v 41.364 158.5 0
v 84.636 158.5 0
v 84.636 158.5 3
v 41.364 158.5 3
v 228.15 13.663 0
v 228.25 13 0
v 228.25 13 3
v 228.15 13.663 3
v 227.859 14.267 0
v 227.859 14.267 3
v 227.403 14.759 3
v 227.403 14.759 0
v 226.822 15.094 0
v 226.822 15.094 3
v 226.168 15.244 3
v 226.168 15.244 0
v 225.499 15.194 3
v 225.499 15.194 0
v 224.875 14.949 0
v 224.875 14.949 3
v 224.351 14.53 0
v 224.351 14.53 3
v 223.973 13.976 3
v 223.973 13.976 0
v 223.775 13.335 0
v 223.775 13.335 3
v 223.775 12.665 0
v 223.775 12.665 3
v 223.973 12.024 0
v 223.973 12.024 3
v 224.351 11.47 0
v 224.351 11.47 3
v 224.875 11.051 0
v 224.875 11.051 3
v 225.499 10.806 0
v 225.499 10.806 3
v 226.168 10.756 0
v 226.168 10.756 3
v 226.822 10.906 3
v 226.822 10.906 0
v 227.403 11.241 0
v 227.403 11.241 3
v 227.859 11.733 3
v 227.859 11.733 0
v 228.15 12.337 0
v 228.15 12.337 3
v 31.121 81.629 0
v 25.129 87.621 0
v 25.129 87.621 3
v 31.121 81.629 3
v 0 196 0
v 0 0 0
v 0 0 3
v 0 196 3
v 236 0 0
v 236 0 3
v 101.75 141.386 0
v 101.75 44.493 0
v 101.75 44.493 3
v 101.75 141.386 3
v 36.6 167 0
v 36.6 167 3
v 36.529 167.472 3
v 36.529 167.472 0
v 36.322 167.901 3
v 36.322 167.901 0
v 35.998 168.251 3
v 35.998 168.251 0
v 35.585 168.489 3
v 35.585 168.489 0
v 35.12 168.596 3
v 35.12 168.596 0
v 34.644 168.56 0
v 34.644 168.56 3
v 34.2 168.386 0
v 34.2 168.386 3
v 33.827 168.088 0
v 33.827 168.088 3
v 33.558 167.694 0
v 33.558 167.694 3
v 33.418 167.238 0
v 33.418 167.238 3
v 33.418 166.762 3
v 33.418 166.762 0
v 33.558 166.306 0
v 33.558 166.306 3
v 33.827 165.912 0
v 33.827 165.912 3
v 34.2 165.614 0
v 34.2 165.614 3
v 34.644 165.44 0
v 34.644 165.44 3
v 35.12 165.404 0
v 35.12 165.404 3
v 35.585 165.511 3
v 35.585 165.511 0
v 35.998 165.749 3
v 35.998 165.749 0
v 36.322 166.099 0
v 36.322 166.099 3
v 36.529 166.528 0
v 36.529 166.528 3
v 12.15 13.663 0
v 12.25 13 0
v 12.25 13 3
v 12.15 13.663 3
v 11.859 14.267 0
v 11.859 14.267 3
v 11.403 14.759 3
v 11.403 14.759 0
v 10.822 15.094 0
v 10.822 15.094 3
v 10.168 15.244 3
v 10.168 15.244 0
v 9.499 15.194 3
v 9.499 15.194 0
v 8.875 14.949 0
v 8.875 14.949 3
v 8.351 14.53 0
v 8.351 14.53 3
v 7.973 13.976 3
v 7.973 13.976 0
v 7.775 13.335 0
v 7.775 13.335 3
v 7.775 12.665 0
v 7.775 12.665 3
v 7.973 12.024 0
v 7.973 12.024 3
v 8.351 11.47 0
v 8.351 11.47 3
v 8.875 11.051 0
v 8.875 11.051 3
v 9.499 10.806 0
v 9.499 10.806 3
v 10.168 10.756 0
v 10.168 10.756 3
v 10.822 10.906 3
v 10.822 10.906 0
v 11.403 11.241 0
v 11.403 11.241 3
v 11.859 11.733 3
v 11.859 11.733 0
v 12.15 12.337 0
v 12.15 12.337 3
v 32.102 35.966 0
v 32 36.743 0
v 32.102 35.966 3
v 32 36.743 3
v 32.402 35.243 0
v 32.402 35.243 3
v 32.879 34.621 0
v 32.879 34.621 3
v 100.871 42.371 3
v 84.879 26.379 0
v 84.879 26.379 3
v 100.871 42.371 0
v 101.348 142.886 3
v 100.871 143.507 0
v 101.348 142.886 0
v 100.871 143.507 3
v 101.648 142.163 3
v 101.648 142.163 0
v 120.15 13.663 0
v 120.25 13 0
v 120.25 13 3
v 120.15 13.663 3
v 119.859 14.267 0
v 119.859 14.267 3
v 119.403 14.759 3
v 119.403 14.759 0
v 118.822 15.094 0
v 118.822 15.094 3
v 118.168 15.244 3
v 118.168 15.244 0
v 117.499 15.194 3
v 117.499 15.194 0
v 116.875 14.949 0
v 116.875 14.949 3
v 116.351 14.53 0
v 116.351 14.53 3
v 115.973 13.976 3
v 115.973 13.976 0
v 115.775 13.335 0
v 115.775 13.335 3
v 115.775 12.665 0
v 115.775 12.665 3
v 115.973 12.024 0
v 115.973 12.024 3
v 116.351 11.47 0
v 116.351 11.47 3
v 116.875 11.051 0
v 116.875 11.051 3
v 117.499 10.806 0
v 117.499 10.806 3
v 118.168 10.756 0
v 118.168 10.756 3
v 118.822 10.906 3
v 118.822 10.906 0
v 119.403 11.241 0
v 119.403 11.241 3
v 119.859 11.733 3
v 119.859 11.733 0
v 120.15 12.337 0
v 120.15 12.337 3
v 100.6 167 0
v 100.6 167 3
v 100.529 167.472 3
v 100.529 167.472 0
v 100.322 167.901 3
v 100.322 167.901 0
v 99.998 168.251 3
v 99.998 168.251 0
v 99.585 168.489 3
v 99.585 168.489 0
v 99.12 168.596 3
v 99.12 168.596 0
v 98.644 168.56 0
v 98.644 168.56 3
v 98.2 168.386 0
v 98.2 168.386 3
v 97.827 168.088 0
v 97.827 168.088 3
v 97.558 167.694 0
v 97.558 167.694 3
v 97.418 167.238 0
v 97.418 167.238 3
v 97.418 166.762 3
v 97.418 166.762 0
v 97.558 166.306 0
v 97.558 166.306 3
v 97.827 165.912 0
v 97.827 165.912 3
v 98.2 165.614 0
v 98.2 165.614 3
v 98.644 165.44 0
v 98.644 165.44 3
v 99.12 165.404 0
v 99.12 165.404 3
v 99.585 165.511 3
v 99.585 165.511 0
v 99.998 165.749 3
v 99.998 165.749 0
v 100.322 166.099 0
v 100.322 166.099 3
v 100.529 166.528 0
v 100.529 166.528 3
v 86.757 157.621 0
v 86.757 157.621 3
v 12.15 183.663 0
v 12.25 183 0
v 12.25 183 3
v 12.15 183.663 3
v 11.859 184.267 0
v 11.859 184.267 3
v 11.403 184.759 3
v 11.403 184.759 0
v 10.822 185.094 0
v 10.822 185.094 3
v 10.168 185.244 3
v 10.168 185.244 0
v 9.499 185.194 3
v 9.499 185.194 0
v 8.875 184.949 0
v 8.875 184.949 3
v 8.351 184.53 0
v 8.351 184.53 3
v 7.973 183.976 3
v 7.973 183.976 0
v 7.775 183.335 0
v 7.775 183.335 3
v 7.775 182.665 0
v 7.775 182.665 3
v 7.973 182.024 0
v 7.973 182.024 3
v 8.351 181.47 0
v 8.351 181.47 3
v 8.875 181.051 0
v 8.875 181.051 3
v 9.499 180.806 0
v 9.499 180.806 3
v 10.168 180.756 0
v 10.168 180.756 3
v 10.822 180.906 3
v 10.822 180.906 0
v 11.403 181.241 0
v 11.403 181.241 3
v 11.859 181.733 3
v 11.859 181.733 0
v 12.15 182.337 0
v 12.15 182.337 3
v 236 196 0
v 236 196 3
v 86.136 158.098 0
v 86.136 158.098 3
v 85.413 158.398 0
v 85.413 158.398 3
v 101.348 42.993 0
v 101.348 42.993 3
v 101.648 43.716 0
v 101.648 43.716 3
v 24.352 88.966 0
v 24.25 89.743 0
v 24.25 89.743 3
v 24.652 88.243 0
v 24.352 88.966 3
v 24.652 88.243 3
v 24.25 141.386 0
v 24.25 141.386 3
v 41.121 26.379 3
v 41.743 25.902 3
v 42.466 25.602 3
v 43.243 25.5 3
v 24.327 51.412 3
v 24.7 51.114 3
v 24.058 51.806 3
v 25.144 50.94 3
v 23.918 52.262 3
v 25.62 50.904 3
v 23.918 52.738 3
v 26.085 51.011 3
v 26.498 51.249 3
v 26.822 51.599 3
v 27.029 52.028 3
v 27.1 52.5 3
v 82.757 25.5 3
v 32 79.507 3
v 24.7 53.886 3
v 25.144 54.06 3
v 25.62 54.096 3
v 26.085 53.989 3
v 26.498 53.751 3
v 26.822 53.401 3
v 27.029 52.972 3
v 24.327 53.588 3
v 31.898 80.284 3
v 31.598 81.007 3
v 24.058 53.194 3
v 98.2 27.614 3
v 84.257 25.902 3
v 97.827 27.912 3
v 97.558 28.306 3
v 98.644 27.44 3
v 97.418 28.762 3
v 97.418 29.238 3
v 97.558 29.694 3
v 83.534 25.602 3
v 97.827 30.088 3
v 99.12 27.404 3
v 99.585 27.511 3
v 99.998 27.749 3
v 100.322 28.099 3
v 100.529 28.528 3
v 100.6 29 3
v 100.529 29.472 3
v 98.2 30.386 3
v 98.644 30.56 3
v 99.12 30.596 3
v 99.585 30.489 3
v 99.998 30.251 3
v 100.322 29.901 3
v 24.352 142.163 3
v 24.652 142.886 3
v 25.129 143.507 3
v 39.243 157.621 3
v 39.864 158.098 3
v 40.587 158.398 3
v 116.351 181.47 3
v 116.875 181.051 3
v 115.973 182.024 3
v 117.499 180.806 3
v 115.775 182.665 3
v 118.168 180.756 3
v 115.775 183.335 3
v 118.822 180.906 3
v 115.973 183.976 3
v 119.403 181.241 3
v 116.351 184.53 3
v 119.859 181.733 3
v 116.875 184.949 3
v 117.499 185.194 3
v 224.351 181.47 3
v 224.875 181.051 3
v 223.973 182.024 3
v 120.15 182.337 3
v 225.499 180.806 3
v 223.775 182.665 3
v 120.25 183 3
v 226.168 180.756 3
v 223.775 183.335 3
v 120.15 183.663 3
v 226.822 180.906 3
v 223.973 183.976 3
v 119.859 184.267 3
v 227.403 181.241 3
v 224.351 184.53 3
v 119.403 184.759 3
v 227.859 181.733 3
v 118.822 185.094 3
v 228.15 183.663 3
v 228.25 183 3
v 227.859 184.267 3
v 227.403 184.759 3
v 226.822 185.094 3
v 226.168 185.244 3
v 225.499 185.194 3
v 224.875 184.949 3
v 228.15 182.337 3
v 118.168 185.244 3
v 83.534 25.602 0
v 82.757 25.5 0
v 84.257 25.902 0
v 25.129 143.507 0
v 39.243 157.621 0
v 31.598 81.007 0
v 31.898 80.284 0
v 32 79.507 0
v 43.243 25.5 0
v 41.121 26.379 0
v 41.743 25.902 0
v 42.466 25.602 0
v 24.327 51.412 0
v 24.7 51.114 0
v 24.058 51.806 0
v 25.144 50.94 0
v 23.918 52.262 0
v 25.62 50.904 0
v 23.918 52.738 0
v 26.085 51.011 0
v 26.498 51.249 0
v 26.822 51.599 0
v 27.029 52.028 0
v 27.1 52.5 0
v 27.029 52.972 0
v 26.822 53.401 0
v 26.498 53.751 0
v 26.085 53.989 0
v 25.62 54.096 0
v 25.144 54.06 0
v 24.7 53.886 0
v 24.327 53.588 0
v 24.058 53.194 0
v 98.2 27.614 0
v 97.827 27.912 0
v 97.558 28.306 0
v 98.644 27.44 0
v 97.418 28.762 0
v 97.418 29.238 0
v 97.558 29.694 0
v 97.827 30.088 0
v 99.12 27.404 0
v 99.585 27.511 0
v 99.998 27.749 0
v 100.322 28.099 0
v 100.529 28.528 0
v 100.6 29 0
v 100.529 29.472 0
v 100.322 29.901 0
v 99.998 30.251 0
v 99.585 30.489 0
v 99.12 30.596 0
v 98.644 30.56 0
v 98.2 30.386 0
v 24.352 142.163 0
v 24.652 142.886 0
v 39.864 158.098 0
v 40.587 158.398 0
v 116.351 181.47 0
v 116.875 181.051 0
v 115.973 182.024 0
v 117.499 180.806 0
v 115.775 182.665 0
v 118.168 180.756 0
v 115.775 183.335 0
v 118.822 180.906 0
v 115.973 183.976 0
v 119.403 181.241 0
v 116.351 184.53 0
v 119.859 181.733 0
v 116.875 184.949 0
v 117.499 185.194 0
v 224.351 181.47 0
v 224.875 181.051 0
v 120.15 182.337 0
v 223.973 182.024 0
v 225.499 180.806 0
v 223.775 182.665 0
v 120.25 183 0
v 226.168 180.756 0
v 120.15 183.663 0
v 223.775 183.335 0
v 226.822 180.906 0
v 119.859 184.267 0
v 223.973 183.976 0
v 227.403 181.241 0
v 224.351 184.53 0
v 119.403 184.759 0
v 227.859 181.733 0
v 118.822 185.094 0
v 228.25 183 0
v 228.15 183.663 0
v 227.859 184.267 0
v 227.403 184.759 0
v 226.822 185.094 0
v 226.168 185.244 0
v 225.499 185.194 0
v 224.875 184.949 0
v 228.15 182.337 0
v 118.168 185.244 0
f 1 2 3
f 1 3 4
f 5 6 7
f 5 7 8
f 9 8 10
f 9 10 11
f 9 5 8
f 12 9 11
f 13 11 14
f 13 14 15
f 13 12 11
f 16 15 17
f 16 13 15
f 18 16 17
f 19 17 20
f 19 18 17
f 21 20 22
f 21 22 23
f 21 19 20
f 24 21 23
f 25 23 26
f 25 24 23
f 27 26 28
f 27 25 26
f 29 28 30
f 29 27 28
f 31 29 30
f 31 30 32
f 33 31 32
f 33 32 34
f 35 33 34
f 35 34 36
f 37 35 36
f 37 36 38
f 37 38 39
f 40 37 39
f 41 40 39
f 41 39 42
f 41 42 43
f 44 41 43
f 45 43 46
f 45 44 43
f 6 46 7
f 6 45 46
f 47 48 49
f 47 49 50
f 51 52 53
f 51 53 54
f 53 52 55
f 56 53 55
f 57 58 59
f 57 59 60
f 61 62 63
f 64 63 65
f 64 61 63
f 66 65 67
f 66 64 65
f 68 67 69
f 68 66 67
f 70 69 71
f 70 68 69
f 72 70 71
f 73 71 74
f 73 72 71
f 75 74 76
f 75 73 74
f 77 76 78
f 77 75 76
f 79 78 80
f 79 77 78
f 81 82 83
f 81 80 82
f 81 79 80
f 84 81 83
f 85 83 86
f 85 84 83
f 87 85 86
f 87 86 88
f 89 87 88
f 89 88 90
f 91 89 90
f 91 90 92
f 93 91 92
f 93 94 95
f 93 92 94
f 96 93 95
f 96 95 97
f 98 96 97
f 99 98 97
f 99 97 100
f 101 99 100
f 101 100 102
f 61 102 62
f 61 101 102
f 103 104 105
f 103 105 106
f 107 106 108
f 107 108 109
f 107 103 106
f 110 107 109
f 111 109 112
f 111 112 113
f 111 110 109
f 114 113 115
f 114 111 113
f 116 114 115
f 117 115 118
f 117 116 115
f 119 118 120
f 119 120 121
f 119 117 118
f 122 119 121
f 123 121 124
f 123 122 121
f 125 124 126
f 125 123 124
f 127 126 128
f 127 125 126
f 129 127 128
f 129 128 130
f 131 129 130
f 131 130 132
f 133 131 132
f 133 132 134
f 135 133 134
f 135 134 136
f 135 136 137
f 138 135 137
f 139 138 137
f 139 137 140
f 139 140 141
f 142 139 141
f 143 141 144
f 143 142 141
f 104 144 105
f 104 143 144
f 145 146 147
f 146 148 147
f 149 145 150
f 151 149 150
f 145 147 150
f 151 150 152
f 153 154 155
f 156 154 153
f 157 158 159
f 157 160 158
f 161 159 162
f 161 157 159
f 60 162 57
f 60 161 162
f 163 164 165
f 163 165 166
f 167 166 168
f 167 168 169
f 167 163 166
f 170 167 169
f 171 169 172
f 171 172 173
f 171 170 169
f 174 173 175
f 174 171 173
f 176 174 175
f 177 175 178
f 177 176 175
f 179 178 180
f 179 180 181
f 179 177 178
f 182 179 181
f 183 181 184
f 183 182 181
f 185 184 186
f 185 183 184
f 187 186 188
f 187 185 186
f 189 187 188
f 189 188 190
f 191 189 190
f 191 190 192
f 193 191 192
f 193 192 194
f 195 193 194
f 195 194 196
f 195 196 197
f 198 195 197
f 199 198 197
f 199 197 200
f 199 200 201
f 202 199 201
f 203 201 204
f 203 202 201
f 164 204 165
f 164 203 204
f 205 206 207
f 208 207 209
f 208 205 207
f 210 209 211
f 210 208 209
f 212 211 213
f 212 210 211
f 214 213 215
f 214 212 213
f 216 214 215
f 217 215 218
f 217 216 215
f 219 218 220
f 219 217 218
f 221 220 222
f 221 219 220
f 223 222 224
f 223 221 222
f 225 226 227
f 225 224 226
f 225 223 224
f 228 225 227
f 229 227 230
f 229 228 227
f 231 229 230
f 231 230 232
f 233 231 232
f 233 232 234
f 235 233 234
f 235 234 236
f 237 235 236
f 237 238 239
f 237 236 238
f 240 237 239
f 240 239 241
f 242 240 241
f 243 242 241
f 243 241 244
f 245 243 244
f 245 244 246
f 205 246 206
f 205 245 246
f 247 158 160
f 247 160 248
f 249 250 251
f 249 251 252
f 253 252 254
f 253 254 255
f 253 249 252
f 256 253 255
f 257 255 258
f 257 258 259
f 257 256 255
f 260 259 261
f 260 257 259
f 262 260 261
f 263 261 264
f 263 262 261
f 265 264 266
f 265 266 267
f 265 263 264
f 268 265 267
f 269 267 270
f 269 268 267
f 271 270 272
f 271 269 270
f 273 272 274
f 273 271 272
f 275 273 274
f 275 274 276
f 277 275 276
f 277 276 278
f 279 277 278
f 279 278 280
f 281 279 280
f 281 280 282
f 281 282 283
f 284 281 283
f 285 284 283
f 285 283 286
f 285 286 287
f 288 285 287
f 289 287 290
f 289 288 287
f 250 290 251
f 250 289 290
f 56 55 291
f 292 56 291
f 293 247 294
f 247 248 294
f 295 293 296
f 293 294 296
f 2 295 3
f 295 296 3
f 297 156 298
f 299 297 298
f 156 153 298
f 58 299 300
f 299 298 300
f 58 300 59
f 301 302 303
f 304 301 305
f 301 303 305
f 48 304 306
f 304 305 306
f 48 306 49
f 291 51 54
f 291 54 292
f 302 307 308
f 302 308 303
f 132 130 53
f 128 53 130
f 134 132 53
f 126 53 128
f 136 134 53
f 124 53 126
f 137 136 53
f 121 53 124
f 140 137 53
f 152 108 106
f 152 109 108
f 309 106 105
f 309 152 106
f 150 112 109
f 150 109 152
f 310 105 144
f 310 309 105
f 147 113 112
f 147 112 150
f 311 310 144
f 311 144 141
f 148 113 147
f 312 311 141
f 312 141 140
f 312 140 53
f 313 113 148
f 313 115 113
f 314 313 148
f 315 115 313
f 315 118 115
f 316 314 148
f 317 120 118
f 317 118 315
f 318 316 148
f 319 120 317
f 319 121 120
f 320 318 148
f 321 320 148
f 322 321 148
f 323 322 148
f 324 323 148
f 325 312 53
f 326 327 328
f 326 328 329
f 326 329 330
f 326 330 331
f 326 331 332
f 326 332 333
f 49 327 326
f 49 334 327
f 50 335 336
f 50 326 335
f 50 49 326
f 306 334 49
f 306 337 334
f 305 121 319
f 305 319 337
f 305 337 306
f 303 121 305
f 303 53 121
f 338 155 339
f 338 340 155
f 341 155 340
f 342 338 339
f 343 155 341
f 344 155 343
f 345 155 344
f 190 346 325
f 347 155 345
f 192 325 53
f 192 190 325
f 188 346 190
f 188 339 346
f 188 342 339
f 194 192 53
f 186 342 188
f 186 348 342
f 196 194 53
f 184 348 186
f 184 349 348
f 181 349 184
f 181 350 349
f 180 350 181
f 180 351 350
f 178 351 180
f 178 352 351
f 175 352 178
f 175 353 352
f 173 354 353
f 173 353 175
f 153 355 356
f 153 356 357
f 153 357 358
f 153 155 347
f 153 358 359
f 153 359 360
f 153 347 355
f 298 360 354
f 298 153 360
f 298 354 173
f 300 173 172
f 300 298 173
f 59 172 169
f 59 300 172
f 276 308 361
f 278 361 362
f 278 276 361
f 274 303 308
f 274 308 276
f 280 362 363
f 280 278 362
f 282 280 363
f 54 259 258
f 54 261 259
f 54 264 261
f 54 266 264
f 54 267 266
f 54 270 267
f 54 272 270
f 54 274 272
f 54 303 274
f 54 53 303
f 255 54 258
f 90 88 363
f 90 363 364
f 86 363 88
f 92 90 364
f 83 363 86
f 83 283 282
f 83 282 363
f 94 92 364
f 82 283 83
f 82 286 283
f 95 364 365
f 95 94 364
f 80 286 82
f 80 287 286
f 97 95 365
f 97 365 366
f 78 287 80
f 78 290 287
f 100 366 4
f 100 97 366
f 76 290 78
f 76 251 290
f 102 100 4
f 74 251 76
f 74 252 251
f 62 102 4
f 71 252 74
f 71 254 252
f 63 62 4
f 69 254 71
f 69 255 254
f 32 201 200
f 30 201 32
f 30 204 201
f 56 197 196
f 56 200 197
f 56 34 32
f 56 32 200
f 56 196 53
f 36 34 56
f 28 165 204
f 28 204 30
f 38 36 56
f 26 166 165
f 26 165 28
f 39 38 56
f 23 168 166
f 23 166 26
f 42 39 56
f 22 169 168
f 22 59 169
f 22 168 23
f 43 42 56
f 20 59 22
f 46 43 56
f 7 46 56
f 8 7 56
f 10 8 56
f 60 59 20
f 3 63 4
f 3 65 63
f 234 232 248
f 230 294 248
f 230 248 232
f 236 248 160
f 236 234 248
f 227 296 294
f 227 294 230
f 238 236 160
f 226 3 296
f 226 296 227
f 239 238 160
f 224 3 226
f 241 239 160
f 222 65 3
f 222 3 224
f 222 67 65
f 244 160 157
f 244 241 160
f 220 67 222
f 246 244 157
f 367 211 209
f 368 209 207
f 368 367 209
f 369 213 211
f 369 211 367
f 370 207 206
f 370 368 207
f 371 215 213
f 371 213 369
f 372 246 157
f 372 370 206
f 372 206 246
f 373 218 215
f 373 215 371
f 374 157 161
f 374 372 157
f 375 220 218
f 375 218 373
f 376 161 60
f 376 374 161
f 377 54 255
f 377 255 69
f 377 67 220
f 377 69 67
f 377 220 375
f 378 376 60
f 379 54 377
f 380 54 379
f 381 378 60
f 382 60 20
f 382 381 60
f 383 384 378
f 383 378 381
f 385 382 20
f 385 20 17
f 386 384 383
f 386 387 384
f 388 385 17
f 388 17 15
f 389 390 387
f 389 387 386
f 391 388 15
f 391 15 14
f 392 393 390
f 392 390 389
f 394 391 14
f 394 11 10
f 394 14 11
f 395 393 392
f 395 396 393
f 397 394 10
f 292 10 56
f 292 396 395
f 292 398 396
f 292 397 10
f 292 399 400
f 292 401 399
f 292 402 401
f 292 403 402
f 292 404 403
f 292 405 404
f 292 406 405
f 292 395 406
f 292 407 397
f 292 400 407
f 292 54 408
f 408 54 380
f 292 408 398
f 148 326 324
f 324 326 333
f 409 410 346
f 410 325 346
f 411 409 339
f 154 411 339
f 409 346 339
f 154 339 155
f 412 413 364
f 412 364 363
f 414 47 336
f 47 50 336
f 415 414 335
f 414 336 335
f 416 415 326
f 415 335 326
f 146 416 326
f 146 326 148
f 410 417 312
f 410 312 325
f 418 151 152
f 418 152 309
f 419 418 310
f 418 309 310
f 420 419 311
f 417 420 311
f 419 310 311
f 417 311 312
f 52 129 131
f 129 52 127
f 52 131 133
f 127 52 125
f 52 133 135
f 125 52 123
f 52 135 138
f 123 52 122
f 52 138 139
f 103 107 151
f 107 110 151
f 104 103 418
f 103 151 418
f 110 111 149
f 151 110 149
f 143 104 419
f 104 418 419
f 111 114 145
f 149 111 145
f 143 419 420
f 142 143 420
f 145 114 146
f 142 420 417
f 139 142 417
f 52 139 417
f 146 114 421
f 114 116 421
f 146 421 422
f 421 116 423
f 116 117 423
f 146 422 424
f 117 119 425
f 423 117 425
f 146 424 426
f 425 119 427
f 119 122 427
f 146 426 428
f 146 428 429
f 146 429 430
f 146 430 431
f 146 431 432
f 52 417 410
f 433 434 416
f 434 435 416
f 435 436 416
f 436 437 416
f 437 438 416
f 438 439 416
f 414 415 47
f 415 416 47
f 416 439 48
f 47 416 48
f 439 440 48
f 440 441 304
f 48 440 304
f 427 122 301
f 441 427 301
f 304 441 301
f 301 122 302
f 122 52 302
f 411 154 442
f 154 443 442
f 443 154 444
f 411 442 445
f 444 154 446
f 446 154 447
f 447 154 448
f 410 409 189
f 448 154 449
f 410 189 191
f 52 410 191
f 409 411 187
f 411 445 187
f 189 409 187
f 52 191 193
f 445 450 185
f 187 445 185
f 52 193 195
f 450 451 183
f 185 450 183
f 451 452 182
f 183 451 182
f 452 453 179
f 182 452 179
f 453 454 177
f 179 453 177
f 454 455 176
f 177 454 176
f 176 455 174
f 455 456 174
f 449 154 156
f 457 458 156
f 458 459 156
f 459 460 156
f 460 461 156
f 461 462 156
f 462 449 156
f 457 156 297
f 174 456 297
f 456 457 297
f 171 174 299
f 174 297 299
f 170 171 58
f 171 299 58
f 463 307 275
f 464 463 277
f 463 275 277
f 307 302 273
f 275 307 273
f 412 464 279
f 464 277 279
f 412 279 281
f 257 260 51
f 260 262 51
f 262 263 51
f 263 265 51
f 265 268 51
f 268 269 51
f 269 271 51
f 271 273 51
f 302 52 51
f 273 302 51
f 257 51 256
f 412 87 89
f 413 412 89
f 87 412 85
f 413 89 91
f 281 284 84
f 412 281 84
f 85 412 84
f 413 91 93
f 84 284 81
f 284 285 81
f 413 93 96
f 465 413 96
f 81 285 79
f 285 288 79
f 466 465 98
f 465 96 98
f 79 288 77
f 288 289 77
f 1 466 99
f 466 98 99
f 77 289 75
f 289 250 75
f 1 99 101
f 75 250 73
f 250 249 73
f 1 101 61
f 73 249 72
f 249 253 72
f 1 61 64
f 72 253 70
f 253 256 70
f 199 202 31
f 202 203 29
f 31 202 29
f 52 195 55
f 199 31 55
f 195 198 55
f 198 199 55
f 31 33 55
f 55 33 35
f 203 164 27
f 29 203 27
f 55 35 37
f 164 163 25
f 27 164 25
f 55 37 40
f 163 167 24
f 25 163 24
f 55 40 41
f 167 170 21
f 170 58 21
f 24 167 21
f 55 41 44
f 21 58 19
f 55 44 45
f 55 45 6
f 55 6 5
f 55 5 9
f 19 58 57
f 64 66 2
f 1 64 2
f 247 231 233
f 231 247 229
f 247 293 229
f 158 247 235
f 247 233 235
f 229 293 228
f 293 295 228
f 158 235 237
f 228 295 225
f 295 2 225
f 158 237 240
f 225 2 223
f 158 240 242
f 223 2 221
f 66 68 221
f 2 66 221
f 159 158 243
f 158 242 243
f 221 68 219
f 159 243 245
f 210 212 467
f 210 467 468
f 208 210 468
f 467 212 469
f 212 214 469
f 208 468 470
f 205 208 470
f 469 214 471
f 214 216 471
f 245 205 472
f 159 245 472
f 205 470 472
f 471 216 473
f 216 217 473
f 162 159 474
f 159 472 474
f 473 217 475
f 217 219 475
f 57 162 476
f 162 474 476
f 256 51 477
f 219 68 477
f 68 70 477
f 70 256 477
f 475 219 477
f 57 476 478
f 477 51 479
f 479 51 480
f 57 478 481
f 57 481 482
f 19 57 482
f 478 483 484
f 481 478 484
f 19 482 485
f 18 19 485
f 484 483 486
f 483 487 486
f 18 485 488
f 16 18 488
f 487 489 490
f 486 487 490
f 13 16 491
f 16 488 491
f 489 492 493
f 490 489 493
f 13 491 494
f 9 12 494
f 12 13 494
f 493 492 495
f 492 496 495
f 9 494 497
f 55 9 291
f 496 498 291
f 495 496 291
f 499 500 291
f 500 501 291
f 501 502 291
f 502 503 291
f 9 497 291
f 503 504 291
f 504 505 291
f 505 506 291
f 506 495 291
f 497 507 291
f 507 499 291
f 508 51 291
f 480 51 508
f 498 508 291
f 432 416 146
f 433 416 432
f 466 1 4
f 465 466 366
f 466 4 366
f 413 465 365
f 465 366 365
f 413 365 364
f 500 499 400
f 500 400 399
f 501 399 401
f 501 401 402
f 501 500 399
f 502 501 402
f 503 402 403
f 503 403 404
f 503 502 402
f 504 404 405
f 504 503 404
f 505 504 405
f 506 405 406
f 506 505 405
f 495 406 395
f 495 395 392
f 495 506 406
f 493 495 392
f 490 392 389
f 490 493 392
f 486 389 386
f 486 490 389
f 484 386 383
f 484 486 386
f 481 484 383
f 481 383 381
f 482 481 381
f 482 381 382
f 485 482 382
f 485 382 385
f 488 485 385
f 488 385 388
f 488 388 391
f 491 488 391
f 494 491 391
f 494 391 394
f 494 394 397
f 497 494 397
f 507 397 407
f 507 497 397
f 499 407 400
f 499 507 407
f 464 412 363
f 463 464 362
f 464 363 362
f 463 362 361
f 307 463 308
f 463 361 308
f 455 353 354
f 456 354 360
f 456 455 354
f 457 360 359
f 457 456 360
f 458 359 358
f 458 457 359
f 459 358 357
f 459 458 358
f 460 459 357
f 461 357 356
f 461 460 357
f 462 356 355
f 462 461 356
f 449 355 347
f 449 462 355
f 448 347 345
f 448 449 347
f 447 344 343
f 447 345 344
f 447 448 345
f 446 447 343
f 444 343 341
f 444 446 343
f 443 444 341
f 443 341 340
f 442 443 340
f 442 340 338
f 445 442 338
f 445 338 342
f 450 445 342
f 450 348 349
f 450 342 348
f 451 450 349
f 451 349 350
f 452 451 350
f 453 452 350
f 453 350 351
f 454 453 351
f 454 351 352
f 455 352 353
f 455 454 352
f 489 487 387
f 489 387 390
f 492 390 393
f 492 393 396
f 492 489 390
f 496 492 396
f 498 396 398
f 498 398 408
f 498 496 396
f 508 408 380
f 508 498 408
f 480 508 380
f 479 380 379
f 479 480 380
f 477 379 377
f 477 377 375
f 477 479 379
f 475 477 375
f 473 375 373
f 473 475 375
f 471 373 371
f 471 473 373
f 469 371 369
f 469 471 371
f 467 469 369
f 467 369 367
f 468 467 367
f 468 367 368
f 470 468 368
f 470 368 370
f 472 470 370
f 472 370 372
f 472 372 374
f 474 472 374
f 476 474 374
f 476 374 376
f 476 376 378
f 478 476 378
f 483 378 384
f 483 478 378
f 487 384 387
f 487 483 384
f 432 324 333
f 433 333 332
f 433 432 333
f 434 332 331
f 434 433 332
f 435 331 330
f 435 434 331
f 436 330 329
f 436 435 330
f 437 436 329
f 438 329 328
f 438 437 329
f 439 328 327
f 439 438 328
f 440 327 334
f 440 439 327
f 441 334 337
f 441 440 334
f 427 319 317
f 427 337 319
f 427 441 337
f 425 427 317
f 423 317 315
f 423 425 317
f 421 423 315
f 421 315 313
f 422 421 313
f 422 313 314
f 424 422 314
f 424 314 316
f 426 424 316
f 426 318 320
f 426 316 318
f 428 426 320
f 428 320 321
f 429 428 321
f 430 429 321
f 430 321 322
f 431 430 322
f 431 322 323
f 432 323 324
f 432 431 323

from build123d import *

# Parameters (mm, degrees)
SKETCH_1_W          = 236
SKETCH_1_H          = 196
SKETCH_1_R          = 2.25
EXTRUDE_1_DEPTH     = 3
SKETCH_2_R          = 1.6
CUT_EXTRUDE_2_DEPTH = 4
FILLET_1_R          = 3


with BuildPart() as part:
    # Эскиз1 → Бобышка-Вытянуть1 (new body)
    with BuildSketch(Plane.XY):
        with Locations((118, 98)):
            Rectangle(SKETCH_1_W, SKETCH_1_H)
        with Locations((10, 183)):
            Circle(SKETCH_1_R, mode=Mode.SUBTRACT)
        with Locations((10, 13)):
            Circle(SKETCH_1_R, mode=Mode.SUBTRACT)
        with Locations((226, 183)):
            Circle(SKETCH_1_R, mode=Mode.SUBTRACT)
        with Locations((226, 13)):
            Circle(SKETCH_1_R, mode=Mode.SUBTRACT)
        with Locations((118, 183)):
            Circle(SKETCH_1_R, mode=Mode.SUBTRACT)
        with Locations((118, 13)):
            Circle(SKETCH_1_R, mode=Mode.SUBTRACT)
    extrude(amount=EXTRUDE_1_DEPTH)

    # Эскиз2 → Вырез-Вытянуть2 (cut, through all)
    with BuildSketch(Plane.XY):
        with Locations((25.5, 52.5)):
            Circle(SKETCH_2_R)
        with Locations((99, 29)):
            Circle(SKETCH_2_R)
        with Locations((35, 167)):
            Circle(SKETCH_2_R)
        with Locations((99, 167)):
            Circle(SKETCH_2_R)
        Polygon((101.75, 142.628747105), (85.878747105, 158.5), (40.121211423, 158.5), (24.25, 142.628788577), (24.25, 88.5), (32, 80.75), (32, 35.5), (42, 25.5), (84, 25.5), (101.75, 43.25), align=None)
    extrude(amount=CUT_EXTRUDE_2_DEPTH, mode=Mode.SUBTRACT)

    # Скругление1
    fillet_1_edges = [part.edges().sort_by_distance(p)[0] for p in [
        (40.121211423, 158.5, 1.5),
        (24.25, 142.628788577, 1.5),
        (24.25, 88.5, 1.5),
        (32, 80.75, 1.5),
        (32, 35.5, 1.5),
        (42, 25.5, 1.5),
        (84, 25.5, 1.5),
        (101.75, 43.25, 1.5),
        (101.75, 142.628747105, 1.5),
        (85.878747105, 158.5, 1.5),
    ]]
    fillet(fillet_1_edges, radius=FILLET_1_R)


solid = part.part
